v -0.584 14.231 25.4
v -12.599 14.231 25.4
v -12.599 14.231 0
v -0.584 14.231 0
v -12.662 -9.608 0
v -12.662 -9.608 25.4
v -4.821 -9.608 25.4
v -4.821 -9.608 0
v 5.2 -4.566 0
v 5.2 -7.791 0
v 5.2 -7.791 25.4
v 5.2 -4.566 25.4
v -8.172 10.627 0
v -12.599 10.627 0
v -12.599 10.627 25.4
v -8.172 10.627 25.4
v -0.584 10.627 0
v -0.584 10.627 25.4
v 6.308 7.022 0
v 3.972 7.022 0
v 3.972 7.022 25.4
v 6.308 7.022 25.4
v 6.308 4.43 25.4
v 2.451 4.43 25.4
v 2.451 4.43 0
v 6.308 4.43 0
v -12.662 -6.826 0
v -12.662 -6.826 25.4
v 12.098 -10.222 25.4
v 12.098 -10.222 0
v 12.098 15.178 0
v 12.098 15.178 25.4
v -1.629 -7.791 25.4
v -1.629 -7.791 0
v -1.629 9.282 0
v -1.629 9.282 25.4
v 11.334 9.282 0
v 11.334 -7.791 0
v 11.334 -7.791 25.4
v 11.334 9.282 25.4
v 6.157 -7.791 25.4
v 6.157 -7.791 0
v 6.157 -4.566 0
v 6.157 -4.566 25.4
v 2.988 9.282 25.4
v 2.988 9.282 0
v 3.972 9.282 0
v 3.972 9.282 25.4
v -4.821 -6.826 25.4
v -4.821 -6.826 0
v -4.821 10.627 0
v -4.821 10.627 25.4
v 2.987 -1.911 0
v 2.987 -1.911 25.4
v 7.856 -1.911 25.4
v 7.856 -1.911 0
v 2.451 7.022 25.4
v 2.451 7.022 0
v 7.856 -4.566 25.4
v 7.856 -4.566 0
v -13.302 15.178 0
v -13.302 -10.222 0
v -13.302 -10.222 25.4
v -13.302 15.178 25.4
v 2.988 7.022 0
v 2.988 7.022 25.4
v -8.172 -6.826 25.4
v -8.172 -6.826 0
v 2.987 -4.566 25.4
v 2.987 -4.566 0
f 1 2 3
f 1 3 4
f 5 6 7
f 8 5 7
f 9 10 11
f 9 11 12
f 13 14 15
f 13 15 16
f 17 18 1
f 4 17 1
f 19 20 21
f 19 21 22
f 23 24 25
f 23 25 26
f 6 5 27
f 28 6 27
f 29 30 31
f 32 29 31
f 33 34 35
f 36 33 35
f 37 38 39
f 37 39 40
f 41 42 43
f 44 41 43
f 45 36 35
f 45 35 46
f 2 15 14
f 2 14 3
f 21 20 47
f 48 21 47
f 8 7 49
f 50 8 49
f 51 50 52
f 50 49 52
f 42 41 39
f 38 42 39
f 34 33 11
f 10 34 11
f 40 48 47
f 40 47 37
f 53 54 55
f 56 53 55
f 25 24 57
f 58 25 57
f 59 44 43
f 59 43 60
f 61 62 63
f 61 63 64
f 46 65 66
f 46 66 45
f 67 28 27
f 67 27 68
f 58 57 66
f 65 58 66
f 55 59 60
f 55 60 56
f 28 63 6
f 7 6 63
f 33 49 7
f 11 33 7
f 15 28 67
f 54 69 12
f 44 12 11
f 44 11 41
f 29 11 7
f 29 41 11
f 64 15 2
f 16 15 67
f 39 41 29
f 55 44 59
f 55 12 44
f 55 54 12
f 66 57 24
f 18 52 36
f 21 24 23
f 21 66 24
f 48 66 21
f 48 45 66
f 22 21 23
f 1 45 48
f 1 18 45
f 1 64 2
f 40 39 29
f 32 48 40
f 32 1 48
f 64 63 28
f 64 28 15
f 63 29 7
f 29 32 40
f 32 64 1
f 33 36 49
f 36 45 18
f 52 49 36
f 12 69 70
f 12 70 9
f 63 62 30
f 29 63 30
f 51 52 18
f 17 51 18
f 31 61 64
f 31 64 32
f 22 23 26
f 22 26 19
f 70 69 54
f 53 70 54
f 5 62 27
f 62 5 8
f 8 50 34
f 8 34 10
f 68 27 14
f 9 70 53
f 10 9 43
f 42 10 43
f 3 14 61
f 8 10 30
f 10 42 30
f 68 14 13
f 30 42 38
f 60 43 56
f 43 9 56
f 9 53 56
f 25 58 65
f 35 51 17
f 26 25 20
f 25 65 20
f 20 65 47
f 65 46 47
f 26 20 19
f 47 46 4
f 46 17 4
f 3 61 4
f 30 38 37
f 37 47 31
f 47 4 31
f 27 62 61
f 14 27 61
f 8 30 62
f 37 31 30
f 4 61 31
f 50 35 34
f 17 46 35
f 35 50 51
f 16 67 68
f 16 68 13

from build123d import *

# Parameters (mm, degrees)
F0_W      = 25.4
F0_H      = 25.4
F1_DEPTH  = 25.4
F2_W      = 12.0143074892
F2_H      = 3.6042919382
F3_DEPTH  = 25.401
F4_W      = 3.3513596281
F4_H      = 17.4523624592
F5_DEPTH  = 25.401
F6_W      = 7.8409165144
F6_H      = 2.7822614647
F7_DEPTH  = 25.401
F10_W     = 12.962804758
F10_H     = 17.0729630627
F11_DEPTH = 25.401
F8_W      = 3.857224714
F8_H      = 2.5925613008
F12_DEPTH = 25.4
F9_W      = 4.8689562827
F9_H      = 2.6557944948
F13_DEPTH = 25.4
F15_W     = 0.9836773388
F15_H     = 3.4875846468
F16_DEPTH = 25.4
F17_W     = 0.9571057744
F17_H     = 4.5728415716
F18_DEPTH = 25.4


with BuildPart() as f1:
    # F0 (on Top) → F1 (new body)
    with BuildSketch(Plane.XY):
        with Locations((-0.6015789695, 2.4779321572)):
            Rectangle(F0_W, F0_H)
    extrude(amount=F1_DEPTH)

    # F2 (on face) → F3 (cut, through all)
    with BuildSketch(Plane.XY.offset(25.4)):
        with Locations((-6.5916299645, 12.428777758)):
            Rectangle(F2_W, F2_H)
    extrude(amount=-F3_DEPTH, mode=Mode.SUBTRACT)

    # F4 (on face) → F5 (cut, through all)
    with BuildSketch(Plane.XY.offset(25.4)):
        with Locations((-6.4967800863, 1.9004505593)):
            Rectangle(F4_W, F4_H)
    extrude(amount=-F5_DEPTH, mode=Mode.SUBTRACT)

    # F6 (on face) → F7 (cut, through all)
    with BuildSketch(Plane.XY.offset(25.4)):
        with Locations((-8.7415585294, -8.2168614026)):
            Rectangle(F6_W, F6_H)
    extrude(amount=-F7_DEPTH, mode=Mode.SUBTRACT)

    # F10 (on face) → F11 (cut, through all)
    with BuildSketch(Plane.XY.offset(25.4)):
        with Locations((4.852715123, 0.7451490965)):
            Rectangle(F10_W, F10_H)
    extrude(amount=-F11_DEPTH, mode=Mode.SUBTRACT)



with BuildPart() as f12:
    # F8 (on face) → F12 (new body)
    with BuildSketch(Plane.XY.offset(25.4)):
        with Locations((4.3793295044, 5.7260587346)):
            Rectangle(F8_W, F8_H)
    extrude(amount=-F12_DEPTH)


with BuildPart() as f13:
    # F9 (on face) → F13 (new body)
    with BuildSketch(Plane.XY.offset(25.4)):
        with Locations((5.4218145087, -3.2385426457)):
            Rectangle(F9_W, F9_H)
    extrude(amount=-F13_DEPTH)


with BuildPart() as f1_1:
    add(f1.part)

    add(f12.part)  # F16 merges F12
    # F15 (on face) → F16 (join)
    with BuildSketch(Plane.XY):
        with Locations((3.4799792338, 8.1227321643)):
            Rectangle(F15_W, F15_H)
    extrude(amount=F16_DEPTH)


    add(f13.part)  # F18 merges F13
    # F17 (on face) → F18 (join)
    with BuildSketch(Plane.XY):
        with Locations((5.6787764188, -6.1330919852)):
            Rectangle(F17_W, F17_H)
    extrude(amount=F18_DEPTH)


solid = f1_1.part
